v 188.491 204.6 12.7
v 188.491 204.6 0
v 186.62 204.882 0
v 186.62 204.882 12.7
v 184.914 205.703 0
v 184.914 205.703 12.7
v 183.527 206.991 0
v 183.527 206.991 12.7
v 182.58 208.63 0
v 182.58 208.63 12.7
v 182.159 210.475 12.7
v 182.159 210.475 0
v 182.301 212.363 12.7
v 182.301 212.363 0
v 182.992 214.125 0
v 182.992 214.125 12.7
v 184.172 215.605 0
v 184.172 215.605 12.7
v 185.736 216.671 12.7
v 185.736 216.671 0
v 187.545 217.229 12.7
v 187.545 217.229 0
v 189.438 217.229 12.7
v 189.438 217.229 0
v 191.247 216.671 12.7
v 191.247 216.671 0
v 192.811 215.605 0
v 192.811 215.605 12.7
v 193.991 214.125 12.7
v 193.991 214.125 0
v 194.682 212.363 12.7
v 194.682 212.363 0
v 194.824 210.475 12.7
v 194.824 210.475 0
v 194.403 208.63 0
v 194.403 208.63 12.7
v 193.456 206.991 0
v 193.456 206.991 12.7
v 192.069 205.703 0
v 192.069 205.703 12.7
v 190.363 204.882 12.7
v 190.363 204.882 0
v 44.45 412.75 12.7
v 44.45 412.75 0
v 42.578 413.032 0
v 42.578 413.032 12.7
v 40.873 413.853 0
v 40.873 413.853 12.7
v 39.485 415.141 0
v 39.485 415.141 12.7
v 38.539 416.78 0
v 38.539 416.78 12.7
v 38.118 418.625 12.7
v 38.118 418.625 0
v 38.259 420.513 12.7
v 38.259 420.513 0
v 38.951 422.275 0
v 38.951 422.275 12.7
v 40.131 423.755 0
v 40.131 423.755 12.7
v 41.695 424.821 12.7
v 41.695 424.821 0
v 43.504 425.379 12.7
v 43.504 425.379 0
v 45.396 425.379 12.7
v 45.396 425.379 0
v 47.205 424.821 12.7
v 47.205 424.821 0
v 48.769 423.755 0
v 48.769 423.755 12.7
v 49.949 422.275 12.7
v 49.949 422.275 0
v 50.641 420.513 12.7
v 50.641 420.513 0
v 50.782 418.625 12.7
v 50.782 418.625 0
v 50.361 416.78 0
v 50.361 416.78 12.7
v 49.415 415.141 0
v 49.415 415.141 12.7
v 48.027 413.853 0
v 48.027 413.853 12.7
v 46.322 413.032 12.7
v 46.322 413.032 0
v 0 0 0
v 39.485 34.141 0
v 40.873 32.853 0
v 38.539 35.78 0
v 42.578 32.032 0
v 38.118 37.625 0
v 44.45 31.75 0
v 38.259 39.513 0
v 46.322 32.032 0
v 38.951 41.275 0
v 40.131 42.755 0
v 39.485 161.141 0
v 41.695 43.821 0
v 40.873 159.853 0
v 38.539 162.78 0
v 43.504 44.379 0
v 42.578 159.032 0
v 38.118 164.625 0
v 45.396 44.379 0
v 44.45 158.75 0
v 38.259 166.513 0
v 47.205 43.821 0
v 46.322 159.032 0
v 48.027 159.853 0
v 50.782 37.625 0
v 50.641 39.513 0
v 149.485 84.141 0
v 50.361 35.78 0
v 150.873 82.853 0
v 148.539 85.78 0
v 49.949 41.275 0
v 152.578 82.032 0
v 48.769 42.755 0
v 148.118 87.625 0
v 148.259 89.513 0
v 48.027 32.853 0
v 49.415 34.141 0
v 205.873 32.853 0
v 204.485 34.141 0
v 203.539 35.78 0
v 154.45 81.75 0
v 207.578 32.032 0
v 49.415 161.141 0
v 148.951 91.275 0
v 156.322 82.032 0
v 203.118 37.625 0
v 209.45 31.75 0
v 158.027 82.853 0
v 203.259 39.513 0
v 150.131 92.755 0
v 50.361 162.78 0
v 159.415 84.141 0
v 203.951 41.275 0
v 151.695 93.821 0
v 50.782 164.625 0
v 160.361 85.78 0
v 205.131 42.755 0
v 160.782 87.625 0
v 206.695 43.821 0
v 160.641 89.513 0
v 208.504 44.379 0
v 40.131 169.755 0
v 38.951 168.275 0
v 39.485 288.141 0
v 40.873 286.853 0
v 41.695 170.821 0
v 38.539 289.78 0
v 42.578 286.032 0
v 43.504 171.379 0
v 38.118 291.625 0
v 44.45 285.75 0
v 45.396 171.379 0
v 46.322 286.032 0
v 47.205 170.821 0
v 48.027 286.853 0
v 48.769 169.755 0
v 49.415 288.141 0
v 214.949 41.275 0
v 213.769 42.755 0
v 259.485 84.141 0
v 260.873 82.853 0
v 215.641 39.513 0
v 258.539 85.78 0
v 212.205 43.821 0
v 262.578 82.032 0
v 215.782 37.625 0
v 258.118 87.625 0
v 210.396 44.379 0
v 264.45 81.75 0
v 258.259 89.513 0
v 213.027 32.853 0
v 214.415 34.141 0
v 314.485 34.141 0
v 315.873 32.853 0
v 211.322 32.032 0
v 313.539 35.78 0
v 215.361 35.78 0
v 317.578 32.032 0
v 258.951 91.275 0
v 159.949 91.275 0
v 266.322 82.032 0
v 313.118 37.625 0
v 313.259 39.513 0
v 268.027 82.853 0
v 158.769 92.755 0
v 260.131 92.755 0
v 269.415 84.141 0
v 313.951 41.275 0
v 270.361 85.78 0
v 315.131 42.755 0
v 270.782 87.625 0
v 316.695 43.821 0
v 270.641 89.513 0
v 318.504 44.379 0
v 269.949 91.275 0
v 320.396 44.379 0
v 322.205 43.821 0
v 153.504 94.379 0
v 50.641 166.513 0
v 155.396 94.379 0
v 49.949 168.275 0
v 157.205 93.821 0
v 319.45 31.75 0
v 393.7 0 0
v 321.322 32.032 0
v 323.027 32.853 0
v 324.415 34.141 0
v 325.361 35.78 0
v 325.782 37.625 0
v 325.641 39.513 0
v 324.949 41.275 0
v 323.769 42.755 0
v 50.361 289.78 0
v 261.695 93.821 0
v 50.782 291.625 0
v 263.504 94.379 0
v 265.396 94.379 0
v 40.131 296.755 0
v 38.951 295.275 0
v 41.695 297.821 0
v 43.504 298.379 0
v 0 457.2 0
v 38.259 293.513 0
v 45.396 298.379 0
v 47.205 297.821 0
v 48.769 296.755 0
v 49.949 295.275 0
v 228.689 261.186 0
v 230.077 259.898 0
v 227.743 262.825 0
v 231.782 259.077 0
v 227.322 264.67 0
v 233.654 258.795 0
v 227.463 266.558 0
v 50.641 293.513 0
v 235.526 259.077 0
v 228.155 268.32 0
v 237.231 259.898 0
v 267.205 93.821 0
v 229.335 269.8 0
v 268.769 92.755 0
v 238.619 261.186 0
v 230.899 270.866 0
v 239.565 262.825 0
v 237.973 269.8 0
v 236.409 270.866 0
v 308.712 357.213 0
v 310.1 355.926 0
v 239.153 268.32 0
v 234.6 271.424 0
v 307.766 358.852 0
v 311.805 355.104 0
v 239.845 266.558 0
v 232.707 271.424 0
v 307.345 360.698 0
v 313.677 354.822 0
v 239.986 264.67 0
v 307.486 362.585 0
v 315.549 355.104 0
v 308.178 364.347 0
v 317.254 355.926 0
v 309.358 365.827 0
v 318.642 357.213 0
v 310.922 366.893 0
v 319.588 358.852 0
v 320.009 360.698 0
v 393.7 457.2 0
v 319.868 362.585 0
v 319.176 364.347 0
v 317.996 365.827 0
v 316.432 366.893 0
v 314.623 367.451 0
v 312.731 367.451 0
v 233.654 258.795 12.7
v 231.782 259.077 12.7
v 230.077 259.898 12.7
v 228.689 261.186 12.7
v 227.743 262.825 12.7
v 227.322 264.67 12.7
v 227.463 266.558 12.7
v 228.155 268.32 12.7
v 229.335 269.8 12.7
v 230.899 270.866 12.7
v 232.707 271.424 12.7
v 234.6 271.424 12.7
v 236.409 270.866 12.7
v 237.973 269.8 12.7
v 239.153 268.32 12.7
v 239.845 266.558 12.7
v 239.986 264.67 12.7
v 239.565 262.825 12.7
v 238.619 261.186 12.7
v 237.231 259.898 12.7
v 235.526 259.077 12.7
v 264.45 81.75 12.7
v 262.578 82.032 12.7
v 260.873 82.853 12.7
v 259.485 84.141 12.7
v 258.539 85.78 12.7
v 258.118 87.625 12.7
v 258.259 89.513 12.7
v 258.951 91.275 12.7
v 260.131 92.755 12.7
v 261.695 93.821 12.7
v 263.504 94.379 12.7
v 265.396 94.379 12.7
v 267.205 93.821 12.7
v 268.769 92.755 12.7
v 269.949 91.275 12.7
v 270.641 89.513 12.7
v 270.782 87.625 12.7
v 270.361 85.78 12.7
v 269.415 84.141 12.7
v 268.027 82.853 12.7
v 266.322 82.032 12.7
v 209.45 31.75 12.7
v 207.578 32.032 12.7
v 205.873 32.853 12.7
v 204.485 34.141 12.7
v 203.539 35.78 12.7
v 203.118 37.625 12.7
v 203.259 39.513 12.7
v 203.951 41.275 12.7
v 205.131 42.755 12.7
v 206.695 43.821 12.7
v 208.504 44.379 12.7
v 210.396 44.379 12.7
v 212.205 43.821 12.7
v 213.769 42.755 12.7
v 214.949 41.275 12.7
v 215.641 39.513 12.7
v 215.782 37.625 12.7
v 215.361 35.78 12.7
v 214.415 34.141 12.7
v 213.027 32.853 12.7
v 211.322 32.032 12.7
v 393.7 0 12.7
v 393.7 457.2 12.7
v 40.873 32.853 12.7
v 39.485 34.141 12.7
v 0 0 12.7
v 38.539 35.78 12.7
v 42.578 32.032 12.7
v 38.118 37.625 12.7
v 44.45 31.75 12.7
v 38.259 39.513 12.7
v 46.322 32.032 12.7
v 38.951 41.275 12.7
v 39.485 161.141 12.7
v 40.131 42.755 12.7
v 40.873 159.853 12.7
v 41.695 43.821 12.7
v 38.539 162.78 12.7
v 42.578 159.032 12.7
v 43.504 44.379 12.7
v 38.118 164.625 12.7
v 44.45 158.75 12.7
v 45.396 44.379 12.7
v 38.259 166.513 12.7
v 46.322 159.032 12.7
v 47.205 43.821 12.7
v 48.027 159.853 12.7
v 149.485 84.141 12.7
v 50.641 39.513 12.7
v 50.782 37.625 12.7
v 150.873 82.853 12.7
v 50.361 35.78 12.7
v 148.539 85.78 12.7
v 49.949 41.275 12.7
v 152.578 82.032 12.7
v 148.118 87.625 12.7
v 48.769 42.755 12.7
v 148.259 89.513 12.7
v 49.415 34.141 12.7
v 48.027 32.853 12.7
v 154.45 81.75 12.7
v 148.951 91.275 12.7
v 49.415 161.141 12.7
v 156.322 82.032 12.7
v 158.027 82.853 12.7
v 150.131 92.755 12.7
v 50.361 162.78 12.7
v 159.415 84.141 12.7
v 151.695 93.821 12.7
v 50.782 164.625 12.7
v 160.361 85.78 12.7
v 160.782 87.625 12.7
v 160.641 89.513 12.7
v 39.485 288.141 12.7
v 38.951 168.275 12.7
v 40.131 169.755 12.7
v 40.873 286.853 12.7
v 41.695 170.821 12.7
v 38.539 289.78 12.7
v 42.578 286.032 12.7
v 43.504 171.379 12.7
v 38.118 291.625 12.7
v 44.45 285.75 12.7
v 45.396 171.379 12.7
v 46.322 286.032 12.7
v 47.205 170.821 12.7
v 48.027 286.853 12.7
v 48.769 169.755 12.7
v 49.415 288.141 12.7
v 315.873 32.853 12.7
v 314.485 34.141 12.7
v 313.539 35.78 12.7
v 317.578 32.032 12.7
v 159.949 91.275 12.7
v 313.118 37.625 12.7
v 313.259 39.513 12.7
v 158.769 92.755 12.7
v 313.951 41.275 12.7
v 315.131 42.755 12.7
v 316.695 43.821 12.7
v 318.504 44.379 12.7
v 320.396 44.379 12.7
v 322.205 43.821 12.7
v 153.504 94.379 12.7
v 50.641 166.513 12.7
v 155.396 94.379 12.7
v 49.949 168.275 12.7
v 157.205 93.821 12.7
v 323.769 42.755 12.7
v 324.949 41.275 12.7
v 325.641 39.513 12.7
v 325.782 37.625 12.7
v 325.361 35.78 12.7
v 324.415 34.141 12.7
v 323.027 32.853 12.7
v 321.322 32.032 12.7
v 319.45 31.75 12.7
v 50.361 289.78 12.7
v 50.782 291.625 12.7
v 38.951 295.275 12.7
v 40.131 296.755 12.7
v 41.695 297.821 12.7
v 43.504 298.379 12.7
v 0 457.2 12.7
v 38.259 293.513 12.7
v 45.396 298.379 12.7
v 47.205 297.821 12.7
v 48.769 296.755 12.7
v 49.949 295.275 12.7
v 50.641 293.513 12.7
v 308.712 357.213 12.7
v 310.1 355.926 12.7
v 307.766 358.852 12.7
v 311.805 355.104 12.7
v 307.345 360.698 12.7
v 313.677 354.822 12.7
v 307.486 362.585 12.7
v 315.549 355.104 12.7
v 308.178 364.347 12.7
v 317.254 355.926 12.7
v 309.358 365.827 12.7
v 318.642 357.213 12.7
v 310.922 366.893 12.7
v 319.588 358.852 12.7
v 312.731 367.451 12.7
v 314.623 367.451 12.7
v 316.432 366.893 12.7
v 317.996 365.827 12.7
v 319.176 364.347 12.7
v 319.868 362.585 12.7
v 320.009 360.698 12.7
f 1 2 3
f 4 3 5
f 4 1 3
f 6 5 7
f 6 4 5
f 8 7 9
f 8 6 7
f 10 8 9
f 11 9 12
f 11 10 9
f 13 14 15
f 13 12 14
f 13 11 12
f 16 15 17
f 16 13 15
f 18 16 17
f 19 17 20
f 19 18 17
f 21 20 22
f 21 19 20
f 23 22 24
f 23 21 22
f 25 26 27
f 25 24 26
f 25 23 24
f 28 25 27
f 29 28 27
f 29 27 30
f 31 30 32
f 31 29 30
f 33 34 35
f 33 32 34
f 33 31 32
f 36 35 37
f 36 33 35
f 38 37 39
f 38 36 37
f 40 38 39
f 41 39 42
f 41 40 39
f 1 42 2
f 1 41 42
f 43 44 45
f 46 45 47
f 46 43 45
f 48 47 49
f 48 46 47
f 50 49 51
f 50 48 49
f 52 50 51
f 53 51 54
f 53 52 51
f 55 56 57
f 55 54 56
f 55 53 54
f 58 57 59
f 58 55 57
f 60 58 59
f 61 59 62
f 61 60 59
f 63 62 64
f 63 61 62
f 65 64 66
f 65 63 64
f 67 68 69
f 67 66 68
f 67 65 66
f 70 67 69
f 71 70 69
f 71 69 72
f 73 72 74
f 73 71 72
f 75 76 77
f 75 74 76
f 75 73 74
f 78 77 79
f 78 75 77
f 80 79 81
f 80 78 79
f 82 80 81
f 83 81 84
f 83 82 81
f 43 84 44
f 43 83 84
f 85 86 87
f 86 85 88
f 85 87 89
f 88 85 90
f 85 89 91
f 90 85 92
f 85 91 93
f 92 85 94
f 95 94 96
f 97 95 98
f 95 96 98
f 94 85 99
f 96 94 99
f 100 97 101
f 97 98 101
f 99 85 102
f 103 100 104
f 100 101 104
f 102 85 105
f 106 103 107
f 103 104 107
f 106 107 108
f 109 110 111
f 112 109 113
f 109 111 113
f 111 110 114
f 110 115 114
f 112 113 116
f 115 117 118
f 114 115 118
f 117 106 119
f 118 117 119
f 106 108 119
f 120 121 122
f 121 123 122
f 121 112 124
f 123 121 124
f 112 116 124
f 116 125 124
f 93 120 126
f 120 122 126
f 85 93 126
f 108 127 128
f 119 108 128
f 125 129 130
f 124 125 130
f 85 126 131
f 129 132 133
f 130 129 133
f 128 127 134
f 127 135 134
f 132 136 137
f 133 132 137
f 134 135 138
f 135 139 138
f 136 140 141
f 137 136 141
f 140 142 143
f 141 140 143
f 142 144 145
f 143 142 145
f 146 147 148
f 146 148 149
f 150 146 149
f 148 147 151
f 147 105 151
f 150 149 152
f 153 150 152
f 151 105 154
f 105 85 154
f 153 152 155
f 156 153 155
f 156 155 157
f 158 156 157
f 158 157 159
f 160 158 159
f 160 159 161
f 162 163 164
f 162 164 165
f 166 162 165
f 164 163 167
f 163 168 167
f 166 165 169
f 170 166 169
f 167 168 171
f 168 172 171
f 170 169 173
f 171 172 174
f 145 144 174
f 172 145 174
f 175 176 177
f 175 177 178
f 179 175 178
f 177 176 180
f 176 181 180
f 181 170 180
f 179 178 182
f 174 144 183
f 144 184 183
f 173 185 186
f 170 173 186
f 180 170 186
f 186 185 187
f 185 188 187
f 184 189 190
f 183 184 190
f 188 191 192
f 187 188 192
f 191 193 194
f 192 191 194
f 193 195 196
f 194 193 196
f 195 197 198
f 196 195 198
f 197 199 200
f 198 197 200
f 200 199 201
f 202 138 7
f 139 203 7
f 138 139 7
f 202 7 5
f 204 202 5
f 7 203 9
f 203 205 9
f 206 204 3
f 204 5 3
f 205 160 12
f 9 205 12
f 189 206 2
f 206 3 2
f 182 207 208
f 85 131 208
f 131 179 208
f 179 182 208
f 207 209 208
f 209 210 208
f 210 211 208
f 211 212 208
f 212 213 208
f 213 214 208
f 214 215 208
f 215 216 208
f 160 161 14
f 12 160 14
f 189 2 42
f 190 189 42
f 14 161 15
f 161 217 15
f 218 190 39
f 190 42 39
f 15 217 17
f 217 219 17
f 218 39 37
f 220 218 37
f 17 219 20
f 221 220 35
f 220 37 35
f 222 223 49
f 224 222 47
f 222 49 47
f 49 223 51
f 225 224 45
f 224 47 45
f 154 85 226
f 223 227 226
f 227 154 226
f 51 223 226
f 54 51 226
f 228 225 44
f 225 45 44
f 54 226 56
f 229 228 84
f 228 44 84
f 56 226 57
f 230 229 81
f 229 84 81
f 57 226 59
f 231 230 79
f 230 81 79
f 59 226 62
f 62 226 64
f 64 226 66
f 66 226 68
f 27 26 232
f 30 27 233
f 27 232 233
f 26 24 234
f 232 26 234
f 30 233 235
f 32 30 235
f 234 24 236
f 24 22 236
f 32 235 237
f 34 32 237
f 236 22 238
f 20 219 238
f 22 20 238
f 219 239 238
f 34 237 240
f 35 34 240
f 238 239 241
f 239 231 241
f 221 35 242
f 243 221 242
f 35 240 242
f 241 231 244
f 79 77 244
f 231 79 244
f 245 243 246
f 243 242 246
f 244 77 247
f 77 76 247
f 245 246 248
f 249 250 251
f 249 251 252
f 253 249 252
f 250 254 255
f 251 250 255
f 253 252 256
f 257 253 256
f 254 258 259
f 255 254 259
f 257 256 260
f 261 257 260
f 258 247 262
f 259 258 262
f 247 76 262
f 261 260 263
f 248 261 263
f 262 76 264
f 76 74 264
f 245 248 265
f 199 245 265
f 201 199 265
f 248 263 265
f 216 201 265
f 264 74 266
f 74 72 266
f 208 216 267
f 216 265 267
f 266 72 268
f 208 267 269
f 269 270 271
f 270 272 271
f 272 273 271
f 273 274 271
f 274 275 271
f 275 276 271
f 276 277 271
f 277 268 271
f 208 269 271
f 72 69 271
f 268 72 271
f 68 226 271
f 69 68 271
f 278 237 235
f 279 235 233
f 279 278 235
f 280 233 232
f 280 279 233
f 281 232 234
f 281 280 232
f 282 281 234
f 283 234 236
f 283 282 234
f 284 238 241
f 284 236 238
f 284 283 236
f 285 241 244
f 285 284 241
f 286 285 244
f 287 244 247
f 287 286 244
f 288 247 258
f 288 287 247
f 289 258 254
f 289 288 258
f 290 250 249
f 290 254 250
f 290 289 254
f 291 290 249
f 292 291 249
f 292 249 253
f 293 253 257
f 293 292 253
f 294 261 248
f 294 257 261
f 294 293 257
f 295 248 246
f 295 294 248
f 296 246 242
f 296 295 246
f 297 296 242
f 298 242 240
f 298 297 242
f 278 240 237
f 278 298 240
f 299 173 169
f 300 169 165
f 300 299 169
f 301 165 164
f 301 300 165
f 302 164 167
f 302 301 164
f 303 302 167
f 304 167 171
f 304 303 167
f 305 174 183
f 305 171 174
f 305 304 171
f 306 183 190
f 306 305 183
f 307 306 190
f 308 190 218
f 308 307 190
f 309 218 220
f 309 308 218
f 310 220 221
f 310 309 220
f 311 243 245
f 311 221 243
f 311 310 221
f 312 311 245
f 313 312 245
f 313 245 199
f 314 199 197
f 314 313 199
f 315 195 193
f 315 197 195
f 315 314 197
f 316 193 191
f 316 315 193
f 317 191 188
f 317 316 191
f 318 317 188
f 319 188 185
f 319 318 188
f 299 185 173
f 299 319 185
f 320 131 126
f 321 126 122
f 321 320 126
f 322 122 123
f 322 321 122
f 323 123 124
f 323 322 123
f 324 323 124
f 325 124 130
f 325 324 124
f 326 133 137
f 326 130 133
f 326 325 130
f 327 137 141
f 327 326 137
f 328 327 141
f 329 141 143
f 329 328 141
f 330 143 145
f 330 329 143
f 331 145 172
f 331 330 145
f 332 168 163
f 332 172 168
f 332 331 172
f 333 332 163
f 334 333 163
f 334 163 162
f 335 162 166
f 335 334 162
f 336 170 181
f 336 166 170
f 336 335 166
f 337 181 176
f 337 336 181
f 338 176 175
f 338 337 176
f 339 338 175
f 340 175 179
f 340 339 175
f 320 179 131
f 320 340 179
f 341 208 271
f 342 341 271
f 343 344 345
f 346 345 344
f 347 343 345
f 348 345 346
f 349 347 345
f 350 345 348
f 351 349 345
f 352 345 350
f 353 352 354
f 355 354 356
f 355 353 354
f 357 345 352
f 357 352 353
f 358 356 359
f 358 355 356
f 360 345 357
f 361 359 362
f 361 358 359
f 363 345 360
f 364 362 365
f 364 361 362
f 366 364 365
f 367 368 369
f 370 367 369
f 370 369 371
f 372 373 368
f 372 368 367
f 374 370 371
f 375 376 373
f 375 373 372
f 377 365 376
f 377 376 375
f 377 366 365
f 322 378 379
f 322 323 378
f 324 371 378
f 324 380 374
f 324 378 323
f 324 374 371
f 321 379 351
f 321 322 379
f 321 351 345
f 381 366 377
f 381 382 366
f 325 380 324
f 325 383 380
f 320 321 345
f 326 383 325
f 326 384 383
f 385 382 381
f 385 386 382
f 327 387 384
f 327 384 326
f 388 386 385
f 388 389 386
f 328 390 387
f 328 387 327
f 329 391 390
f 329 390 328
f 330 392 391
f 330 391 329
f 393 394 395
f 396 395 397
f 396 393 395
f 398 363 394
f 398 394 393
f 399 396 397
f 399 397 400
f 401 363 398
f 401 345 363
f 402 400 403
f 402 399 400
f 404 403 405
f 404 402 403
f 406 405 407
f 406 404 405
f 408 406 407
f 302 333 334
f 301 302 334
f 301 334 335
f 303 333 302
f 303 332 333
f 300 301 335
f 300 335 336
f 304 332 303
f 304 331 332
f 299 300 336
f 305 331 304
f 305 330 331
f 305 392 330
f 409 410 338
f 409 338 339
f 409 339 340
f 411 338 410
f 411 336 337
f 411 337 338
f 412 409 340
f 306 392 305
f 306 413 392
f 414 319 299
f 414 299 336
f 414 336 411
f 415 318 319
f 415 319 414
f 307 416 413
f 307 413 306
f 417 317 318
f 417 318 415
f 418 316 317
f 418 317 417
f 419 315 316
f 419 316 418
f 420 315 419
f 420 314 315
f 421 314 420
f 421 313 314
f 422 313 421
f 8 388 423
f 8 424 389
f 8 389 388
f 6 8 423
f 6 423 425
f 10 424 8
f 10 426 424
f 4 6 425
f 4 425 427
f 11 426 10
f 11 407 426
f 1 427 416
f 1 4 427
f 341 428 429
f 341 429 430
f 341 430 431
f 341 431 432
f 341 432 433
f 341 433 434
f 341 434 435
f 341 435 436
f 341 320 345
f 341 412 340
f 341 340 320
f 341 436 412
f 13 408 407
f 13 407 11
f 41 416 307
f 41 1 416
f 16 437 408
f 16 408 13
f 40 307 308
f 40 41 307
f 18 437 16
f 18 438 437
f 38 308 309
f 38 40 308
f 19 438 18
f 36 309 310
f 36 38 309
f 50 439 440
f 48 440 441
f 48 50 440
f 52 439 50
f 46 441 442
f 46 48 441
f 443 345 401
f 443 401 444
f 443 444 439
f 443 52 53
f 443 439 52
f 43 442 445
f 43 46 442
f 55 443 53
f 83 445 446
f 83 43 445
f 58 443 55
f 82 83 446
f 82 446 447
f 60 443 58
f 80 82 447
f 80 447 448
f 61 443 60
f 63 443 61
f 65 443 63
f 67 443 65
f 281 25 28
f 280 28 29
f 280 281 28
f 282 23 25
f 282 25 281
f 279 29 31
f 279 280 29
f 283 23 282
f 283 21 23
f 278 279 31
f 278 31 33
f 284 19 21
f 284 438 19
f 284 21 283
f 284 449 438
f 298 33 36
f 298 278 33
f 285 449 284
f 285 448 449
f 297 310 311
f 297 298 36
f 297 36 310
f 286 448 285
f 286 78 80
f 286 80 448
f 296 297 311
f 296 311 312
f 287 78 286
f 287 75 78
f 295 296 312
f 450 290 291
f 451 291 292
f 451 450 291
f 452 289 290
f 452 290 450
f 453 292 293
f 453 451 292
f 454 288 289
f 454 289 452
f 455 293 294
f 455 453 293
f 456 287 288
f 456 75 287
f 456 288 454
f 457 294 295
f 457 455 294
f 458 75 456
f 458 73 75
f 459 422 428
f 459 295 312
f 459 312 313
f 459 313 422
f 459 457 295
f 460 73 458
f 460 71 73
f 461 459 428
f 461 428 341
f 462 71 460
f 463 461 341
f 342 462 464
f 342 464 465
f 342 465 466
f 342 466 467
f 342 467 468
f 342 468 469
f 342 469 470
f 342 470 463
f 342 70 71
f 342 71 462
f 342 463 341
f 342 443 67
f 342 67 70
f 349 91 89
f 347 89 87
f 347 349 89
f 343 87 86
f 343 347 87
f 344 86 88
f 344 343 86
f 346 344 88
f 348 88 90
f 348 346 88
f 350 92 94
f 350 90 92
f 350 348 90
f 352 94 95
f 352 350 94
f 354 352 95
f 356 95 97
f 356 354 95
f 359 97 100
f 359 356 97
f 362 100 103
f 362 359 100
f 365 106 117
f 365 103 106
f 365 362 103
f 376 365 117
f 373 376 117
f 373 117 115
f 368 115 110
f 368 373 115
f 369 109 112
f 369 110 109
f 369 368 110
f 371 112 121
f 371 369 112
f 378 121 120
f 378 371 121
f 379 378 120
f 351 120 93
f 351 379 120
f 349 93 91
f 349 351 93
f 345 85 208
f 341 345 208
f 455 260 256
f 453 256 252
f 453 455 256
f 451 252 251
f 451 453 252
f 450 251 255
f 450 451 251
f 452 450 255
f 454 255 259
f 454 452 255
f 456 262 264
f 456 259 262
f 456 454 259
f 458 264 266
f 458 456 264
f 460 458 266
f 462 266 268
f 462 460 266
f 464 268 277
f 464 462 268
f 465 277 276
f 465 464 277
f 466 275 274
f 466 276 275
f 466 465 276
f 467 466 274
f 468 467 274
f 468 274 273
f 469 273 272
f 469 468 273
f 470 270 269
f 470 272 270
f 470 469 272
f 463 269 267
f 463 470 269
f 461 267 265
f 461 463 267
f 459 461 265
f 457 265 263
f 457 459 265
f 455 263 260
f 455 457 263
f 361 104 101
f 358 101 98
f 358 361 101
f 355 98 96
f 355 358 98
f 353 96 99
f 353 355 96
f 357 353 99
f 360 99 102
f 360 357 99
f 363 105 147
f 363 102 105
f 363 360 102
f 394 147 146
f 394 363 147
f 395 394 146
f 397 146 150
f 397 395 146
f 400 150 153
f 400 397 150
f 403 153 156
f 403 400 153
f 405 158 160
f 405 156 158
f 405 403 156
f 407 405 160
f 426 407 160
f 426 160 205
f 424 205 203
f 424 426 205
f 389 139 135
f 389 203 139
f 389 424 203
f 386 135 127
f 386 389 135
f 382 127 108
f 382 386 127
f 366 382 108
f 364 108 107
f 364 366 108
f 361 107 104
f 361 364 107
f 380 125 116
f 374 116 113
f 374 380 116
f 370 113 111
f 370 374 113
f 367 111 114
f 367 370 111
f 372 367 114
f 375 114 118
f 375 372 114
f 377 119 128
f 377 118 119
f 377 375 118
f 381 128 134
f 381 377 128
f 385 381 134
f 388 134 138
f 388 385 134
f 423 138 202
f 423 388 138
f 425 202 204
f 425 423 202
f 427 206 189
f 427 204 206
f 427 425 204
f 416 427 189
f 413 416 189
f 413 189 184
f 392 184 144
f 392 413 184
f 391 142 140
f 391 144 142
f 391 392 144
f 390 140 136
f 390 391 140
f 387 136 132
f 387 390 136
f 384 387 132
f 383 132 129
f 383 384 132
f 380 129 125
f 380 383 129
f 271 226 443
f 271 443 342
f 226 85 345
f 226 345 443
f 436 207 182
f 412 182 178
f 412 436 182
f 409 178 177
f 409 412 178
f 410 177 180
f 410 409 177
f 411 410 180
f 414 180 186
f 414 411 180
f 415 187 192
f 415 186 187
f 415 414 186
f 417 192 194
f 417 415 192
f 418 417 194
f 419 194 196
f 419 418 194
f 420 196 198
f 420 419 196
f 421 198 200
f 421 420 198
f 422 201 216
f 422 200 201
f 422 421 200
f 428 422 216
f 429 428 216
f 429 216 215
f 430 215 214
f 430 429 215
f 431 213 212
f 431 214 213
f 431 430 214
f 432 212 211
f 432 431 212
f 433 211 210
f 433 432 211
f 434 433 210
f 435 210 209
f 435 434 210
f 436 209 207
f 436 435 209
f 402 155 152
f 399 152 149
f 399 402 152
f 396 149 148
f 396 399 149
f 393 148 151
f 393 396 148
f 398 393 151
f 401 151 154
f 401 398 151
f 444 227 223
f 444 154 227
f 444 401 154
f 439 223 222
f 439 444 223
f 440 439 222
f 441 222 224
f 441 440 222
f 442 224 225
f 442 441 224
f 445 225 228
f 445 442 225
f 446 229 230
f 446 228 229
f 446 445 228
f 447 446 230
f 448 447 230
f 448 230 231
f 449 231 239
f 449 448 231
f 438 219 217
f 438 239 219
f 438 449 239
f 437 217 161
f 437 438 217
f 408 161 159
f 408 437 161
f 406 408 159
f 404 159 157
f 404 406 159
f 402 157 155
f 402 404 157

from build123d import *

# Parameters (mm, degrees)
SKETCH1_W                 = 393.7
SKETCH1_H                 = 457.2
PLATE_DEPTH               = 12.7
PATTERN_LINEAR_1136_COUNT = 4
PATTERN_LINEAR_1136_PITCH = 127


with BuildPart() as part:
    # Sketch1 → Plate (new body)
    with BuildSketch(Plane.XY):
        with Locations((196.85, 228.6)):
            Rectangle(SKETCH1_W, SKETCH1_H)
    extrude(amount=PLATE_DEPTH)

    # Sketch3 → Hole (revolve, cut)
    with BuildSketch(Plane(origin=(44.45, 38.1, 12.7), x_dir=(0, -1, 0), z_dir=(1, 0, 0))):
        Polygon((0, 0), (0, 29.215464931), (6.35, 25.4), (6.35, 0), align=None)
    hole = revolve(axis=Axis((44.45, 38.1, 19.05), (0, 0, -1)), mode=Mode.SUBTRACT)

    # Pattern Linear 1136: Hole ×4
    with Locations(*[(0, i * PATTERN_LINEAR_1136_PITCH, 0) for i in range(1, PATTERN_LINEAR_1136_COUNT)]):
        add(hole, mode=Mode.SUBTRACT)

    # 草圖複製排列1: Hole at 3 more places
    with Locations((189.2039, 227.04468, 0), (269.22695, 323.07234, 0), (144.04149, 172.849788, 0)):
        add(hole, mode=Mode.SUBTRACT)

    # 草圖複製排列2: Hole at 4 more places
    with Locations((165, 0, 0), (275, 0, 0), (110, 50, 0), (220, 50, 0)):
        add(hole, mode=Mode.SUBTRACT)


solid = part.part
